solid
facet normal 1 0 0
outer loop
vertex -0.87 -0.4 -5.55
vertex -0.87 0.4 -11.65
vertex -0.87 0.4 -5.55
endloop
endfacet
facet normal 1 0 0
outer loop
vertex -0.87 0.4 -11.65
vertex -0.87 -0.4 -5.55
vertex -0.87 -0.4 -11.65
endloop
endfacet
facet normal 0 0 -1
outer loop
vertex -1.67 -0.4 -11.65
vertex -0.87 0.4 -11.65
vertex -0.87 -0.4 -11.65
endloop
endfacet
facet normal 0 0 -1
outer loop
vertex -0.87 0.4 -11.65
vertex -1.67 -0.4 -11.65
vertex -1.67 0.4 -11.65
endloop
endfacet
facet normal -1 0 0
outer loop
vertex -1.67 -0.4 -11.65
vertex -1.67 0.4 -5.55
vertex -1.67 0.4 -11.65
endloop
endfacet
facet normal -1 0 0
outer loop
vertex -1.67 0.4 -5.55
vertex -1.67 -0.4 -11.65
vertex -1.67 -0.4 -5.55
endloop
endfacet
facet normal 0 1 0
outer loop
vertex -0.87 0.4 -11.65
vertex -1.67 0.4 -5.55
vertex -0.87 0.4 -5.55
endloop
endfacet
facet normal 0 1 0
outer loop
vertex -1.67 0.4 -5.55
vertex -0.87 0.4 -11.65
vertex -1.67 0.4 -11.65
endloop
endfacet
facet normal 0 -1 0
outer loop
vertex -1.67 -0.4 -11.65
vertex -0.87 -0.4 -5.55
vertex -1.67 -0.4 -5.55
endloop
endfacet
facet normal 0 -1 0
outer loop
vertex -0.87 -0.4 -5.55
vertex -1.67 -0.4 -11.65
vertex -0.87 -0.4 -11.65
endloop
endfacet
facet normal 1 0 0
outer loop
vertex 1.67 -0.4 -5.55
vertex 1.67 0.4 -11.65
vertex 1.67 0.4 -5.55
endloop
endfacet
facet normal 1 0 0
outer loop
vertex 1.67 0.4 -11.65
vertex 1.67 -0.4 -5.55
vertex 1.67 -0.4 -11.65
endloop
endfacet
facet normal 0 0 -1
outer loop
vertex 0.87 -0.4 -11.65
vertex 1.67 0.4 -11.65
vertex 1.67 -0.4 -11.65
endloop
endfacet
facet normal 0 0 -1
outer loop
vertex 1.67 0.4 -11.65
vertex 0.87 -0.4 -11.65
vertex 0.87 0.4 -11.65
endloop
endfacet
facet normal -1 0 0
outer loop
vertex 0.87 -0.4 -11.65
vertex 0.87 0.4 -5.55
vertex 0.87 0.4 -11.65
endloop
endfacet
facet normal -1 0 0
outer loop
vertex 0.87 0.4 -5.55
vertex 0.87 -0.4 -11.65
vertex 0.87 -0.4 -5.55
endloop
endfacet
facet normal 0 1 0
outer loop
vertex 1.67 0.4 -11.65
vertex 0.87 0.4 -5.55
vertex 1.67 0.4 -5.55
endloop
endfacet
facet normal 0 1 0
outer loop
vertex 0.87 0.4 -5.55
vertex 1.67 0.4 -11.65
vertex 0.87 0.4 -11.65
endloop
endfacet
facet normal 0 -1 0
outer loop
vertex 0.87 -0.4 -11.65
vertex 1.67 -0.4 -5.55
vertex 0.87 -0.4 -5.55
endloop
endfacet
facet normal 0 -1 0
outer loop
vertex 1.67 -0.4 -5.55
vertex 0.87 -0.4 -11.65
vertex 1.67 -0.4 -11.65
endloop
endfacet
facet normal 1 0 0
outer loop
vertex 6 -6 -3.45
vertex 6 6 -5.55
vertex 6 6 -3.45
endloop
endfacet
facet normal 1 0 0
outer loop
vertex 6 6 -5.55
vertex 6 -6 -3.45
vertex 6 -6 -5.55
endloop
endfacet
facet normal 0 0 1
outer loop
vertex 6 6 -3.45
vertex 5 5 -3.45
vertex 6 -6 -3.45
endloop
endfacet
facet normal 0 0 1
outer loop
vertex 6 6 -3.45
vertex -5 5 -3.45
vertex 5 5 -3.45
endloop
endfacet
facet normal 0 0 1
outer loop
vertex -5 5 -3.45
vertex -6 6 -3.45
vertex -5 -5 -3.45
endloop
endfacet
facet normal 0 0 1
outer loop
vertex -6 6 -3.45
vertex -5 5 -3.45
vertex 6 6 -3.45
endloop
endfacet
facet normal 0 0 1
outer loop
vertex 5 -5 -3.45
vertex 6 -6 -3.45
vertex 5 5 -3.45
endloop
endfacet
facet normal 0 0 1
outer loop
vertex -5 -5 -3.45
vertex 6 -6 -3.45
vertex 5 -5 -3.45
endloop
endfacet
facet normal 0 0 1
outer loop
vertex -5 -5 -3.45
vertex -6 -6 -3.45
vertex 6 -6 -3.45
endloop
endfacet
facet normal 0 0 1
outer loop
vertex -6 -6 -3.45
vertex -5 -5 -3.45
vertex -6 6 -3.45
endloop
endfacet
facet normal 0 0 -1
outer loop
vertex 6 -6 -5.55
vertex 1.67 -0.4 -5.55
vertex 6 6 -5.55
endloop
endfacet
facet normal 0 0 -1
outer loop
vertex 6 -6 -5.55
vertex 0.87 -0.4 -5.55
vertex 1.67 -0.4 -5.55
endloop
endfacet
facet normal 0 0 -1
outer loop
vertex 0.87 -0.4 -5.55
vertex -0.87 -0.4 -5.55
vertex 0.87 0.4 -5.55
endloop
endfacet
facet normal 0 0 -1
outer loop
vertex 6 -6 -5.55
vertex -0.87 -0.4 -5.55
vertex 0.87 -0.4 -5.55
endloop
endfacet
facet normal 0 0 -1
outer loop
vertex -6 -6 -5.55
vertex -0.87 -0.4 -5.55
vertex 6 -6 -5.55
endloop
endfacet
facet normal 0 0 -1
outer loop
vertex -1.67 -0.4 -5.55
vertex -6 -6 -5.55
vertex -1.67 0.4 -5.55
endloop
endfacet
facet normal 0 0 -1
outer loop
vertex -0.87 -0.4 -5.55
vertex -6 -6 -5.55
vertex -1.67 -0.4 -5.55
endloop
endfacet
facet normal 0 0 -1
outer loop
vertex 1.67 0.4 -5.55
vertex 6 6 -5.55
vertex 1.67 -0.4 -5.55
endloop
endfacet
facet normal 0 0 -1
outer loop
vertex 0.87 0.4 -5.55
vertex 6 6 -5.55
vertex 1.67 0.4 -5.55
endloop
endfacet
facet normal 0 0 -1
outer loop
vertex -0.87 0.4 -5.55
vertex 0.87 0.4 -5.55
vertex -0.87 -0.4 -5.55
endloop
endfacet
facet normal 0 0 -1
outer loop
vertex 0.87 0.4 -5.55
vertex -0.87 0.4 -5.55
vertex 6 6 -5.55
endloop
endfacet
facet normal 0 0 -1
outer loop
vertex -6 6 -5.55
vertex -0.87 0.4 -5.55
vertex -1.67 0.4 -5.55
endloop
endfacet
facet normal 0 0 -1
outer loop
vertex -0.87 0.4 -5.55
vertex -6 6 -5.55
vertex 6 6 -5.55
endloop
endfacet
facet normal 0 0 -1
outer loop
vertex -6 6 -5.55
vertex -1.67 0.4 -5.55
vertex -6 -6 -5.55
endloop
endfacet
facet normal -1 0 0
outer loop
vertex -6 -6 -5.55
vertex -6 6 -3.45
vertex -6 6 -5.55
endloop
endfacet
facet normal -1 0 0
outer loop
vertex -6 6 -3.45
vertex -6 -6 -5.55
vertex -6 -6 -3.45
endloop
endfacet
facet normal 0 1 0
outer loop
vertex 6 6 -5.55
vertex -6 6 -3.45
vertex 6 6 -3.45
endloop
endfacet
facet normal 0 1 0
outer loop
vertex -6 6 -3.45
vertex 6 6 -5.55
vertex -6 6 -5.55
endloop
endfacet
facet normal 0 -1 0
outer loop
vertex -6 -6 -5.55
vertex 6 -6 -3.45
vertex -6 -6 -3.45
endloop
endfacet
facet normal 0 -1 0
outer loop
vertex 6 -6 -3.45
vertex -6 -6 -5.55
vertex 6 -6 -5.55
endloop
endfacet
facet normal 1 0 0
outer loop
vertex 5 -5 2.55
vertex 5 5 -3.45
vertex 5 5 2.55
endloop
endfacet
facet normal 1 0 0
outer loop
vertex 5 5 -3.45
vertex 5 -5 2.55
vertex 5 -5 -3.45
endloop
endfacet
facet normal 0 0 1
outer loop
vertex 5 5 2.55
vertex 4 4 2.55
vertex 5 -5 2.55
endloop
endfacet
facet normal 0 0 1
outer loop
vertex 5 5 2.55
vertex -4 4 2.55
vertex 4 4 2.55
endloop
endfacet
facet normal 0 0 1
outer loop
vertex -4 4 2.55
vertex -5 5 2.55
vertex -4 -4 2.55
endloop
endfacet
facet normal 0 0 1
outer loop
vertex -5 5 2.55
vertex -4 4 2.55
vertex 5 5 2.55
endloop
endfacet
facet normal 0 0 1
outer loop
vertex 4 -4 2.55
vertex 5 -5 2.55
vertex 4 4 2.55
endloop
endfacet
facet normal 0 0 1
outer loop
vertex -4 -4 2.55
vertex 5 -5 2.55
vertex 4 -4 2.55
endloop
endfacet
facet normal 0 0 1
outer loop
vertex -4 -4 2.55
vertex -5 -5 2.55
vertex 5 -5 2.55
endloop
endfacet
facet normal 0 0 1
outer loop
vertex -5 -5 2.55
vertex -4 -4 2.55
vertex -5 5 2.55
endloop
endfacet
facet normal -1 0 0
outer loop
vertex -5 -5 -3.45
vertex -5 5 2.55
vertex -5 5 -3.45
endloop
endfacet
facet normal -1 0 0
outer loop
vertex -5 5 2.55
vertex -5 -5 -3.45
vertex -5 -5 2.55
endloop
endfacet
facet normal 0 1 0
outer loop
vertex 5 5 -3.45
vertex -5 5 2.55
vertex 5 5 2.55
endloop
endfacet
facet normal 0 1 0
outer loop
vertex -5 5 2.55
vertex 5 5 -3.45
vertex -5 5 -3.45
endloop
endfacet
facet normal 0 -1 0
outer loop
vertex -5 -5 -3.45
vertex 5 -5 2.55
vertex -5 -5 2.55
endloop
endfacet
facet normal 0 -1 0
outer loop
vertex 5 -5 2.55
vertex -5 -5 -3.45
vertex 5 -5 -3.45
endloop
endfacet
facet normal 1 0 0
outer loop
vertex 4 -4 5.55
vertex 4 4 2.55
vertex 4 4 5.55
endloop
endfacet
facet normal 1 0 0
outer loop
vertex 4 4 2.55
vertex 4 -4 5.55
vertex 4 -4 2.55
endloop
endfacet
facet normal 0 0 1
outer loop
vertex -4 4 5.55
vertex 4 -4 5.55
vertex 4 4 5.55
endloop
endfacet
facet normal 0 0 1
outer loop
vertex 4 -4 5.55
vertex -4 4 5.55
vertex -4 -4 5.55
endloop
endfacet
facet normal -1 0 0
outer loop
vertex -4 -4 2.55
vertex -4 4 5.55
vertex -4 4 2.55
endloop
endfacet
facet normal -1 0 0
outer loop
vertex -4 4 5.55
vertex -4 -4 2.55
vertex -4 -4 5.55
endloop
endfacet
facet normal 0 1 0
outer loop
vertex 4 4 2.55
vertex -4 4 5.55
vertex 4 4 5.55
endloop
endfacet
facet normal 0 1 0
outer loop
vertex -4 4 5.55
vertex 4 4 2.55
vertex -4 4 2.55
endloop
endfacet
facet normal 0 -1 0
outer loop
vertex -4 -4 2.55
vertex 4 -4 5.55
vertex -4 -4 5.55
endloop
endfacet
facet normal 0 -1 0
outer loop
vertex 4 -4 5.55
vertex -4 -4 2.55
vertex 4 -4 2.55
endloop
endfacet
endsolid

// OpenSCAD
// A led (cube-like LED module, single connected solid)
// Fixed: ensure visible 3D geometry in all views, cube-like blocks (no through-hole LED look),
// and ONE connected solid (no separate colored parts).

// Parameters
body_w = 10;          // main body width (X)
body_d = 10;          // main body depth (Y)
body_h = 6;           // main body height (Z)

top_w  = 8;           // top block width
top_d  = 8;           // top block depth
top_h  = 3;           // top block height

base_w = 12;          // bottom flange width
base_d = 12;          // bottom flange depth
base_h = 1.5;         // bottom flange height

lead_t = 0.8;         // lead thickness (square)
lead_pitch = 2.54;    // lead spacing
lead_len = 7;         // lead length below base

overlap = 0.6;        // overlap to guarantee watertight union

module led_solid() {
    total_h = base_h + body_h + top_h;
    z0 = -total_h/2;

    union() {
        // Base flange
        translate([0, 0, z0 + base_h/2])
            cube([base_w, base_d, base_h + overlap], center=true);

        // Main body (sits on base)
        translate([0, 0, z0 + base_h + body_h/2])
            cube([body_w, body_d, body_h + overlap], center=true);

        // Top block (sits on body)
        translate([0, 0, z0 + base_h + body_h + top_h/2])
            cube([top_w, top_d, top_h + overlap], center=true);

        // Leads: start slightly inside the base to ensure connection
        lead_start_z = z0 + base_h - overlap;          // inside base
        lead_center_z = lead_start_z - lead_len/2;     // extend downward

        for (sx = [-1, 1]) {
            translate([sx*lead_pitch/2, 0, lead_center_z])
                cube([lead_t, lead_t, lead_len + overlap], center=true);
        }
    }
}

led_solid();
